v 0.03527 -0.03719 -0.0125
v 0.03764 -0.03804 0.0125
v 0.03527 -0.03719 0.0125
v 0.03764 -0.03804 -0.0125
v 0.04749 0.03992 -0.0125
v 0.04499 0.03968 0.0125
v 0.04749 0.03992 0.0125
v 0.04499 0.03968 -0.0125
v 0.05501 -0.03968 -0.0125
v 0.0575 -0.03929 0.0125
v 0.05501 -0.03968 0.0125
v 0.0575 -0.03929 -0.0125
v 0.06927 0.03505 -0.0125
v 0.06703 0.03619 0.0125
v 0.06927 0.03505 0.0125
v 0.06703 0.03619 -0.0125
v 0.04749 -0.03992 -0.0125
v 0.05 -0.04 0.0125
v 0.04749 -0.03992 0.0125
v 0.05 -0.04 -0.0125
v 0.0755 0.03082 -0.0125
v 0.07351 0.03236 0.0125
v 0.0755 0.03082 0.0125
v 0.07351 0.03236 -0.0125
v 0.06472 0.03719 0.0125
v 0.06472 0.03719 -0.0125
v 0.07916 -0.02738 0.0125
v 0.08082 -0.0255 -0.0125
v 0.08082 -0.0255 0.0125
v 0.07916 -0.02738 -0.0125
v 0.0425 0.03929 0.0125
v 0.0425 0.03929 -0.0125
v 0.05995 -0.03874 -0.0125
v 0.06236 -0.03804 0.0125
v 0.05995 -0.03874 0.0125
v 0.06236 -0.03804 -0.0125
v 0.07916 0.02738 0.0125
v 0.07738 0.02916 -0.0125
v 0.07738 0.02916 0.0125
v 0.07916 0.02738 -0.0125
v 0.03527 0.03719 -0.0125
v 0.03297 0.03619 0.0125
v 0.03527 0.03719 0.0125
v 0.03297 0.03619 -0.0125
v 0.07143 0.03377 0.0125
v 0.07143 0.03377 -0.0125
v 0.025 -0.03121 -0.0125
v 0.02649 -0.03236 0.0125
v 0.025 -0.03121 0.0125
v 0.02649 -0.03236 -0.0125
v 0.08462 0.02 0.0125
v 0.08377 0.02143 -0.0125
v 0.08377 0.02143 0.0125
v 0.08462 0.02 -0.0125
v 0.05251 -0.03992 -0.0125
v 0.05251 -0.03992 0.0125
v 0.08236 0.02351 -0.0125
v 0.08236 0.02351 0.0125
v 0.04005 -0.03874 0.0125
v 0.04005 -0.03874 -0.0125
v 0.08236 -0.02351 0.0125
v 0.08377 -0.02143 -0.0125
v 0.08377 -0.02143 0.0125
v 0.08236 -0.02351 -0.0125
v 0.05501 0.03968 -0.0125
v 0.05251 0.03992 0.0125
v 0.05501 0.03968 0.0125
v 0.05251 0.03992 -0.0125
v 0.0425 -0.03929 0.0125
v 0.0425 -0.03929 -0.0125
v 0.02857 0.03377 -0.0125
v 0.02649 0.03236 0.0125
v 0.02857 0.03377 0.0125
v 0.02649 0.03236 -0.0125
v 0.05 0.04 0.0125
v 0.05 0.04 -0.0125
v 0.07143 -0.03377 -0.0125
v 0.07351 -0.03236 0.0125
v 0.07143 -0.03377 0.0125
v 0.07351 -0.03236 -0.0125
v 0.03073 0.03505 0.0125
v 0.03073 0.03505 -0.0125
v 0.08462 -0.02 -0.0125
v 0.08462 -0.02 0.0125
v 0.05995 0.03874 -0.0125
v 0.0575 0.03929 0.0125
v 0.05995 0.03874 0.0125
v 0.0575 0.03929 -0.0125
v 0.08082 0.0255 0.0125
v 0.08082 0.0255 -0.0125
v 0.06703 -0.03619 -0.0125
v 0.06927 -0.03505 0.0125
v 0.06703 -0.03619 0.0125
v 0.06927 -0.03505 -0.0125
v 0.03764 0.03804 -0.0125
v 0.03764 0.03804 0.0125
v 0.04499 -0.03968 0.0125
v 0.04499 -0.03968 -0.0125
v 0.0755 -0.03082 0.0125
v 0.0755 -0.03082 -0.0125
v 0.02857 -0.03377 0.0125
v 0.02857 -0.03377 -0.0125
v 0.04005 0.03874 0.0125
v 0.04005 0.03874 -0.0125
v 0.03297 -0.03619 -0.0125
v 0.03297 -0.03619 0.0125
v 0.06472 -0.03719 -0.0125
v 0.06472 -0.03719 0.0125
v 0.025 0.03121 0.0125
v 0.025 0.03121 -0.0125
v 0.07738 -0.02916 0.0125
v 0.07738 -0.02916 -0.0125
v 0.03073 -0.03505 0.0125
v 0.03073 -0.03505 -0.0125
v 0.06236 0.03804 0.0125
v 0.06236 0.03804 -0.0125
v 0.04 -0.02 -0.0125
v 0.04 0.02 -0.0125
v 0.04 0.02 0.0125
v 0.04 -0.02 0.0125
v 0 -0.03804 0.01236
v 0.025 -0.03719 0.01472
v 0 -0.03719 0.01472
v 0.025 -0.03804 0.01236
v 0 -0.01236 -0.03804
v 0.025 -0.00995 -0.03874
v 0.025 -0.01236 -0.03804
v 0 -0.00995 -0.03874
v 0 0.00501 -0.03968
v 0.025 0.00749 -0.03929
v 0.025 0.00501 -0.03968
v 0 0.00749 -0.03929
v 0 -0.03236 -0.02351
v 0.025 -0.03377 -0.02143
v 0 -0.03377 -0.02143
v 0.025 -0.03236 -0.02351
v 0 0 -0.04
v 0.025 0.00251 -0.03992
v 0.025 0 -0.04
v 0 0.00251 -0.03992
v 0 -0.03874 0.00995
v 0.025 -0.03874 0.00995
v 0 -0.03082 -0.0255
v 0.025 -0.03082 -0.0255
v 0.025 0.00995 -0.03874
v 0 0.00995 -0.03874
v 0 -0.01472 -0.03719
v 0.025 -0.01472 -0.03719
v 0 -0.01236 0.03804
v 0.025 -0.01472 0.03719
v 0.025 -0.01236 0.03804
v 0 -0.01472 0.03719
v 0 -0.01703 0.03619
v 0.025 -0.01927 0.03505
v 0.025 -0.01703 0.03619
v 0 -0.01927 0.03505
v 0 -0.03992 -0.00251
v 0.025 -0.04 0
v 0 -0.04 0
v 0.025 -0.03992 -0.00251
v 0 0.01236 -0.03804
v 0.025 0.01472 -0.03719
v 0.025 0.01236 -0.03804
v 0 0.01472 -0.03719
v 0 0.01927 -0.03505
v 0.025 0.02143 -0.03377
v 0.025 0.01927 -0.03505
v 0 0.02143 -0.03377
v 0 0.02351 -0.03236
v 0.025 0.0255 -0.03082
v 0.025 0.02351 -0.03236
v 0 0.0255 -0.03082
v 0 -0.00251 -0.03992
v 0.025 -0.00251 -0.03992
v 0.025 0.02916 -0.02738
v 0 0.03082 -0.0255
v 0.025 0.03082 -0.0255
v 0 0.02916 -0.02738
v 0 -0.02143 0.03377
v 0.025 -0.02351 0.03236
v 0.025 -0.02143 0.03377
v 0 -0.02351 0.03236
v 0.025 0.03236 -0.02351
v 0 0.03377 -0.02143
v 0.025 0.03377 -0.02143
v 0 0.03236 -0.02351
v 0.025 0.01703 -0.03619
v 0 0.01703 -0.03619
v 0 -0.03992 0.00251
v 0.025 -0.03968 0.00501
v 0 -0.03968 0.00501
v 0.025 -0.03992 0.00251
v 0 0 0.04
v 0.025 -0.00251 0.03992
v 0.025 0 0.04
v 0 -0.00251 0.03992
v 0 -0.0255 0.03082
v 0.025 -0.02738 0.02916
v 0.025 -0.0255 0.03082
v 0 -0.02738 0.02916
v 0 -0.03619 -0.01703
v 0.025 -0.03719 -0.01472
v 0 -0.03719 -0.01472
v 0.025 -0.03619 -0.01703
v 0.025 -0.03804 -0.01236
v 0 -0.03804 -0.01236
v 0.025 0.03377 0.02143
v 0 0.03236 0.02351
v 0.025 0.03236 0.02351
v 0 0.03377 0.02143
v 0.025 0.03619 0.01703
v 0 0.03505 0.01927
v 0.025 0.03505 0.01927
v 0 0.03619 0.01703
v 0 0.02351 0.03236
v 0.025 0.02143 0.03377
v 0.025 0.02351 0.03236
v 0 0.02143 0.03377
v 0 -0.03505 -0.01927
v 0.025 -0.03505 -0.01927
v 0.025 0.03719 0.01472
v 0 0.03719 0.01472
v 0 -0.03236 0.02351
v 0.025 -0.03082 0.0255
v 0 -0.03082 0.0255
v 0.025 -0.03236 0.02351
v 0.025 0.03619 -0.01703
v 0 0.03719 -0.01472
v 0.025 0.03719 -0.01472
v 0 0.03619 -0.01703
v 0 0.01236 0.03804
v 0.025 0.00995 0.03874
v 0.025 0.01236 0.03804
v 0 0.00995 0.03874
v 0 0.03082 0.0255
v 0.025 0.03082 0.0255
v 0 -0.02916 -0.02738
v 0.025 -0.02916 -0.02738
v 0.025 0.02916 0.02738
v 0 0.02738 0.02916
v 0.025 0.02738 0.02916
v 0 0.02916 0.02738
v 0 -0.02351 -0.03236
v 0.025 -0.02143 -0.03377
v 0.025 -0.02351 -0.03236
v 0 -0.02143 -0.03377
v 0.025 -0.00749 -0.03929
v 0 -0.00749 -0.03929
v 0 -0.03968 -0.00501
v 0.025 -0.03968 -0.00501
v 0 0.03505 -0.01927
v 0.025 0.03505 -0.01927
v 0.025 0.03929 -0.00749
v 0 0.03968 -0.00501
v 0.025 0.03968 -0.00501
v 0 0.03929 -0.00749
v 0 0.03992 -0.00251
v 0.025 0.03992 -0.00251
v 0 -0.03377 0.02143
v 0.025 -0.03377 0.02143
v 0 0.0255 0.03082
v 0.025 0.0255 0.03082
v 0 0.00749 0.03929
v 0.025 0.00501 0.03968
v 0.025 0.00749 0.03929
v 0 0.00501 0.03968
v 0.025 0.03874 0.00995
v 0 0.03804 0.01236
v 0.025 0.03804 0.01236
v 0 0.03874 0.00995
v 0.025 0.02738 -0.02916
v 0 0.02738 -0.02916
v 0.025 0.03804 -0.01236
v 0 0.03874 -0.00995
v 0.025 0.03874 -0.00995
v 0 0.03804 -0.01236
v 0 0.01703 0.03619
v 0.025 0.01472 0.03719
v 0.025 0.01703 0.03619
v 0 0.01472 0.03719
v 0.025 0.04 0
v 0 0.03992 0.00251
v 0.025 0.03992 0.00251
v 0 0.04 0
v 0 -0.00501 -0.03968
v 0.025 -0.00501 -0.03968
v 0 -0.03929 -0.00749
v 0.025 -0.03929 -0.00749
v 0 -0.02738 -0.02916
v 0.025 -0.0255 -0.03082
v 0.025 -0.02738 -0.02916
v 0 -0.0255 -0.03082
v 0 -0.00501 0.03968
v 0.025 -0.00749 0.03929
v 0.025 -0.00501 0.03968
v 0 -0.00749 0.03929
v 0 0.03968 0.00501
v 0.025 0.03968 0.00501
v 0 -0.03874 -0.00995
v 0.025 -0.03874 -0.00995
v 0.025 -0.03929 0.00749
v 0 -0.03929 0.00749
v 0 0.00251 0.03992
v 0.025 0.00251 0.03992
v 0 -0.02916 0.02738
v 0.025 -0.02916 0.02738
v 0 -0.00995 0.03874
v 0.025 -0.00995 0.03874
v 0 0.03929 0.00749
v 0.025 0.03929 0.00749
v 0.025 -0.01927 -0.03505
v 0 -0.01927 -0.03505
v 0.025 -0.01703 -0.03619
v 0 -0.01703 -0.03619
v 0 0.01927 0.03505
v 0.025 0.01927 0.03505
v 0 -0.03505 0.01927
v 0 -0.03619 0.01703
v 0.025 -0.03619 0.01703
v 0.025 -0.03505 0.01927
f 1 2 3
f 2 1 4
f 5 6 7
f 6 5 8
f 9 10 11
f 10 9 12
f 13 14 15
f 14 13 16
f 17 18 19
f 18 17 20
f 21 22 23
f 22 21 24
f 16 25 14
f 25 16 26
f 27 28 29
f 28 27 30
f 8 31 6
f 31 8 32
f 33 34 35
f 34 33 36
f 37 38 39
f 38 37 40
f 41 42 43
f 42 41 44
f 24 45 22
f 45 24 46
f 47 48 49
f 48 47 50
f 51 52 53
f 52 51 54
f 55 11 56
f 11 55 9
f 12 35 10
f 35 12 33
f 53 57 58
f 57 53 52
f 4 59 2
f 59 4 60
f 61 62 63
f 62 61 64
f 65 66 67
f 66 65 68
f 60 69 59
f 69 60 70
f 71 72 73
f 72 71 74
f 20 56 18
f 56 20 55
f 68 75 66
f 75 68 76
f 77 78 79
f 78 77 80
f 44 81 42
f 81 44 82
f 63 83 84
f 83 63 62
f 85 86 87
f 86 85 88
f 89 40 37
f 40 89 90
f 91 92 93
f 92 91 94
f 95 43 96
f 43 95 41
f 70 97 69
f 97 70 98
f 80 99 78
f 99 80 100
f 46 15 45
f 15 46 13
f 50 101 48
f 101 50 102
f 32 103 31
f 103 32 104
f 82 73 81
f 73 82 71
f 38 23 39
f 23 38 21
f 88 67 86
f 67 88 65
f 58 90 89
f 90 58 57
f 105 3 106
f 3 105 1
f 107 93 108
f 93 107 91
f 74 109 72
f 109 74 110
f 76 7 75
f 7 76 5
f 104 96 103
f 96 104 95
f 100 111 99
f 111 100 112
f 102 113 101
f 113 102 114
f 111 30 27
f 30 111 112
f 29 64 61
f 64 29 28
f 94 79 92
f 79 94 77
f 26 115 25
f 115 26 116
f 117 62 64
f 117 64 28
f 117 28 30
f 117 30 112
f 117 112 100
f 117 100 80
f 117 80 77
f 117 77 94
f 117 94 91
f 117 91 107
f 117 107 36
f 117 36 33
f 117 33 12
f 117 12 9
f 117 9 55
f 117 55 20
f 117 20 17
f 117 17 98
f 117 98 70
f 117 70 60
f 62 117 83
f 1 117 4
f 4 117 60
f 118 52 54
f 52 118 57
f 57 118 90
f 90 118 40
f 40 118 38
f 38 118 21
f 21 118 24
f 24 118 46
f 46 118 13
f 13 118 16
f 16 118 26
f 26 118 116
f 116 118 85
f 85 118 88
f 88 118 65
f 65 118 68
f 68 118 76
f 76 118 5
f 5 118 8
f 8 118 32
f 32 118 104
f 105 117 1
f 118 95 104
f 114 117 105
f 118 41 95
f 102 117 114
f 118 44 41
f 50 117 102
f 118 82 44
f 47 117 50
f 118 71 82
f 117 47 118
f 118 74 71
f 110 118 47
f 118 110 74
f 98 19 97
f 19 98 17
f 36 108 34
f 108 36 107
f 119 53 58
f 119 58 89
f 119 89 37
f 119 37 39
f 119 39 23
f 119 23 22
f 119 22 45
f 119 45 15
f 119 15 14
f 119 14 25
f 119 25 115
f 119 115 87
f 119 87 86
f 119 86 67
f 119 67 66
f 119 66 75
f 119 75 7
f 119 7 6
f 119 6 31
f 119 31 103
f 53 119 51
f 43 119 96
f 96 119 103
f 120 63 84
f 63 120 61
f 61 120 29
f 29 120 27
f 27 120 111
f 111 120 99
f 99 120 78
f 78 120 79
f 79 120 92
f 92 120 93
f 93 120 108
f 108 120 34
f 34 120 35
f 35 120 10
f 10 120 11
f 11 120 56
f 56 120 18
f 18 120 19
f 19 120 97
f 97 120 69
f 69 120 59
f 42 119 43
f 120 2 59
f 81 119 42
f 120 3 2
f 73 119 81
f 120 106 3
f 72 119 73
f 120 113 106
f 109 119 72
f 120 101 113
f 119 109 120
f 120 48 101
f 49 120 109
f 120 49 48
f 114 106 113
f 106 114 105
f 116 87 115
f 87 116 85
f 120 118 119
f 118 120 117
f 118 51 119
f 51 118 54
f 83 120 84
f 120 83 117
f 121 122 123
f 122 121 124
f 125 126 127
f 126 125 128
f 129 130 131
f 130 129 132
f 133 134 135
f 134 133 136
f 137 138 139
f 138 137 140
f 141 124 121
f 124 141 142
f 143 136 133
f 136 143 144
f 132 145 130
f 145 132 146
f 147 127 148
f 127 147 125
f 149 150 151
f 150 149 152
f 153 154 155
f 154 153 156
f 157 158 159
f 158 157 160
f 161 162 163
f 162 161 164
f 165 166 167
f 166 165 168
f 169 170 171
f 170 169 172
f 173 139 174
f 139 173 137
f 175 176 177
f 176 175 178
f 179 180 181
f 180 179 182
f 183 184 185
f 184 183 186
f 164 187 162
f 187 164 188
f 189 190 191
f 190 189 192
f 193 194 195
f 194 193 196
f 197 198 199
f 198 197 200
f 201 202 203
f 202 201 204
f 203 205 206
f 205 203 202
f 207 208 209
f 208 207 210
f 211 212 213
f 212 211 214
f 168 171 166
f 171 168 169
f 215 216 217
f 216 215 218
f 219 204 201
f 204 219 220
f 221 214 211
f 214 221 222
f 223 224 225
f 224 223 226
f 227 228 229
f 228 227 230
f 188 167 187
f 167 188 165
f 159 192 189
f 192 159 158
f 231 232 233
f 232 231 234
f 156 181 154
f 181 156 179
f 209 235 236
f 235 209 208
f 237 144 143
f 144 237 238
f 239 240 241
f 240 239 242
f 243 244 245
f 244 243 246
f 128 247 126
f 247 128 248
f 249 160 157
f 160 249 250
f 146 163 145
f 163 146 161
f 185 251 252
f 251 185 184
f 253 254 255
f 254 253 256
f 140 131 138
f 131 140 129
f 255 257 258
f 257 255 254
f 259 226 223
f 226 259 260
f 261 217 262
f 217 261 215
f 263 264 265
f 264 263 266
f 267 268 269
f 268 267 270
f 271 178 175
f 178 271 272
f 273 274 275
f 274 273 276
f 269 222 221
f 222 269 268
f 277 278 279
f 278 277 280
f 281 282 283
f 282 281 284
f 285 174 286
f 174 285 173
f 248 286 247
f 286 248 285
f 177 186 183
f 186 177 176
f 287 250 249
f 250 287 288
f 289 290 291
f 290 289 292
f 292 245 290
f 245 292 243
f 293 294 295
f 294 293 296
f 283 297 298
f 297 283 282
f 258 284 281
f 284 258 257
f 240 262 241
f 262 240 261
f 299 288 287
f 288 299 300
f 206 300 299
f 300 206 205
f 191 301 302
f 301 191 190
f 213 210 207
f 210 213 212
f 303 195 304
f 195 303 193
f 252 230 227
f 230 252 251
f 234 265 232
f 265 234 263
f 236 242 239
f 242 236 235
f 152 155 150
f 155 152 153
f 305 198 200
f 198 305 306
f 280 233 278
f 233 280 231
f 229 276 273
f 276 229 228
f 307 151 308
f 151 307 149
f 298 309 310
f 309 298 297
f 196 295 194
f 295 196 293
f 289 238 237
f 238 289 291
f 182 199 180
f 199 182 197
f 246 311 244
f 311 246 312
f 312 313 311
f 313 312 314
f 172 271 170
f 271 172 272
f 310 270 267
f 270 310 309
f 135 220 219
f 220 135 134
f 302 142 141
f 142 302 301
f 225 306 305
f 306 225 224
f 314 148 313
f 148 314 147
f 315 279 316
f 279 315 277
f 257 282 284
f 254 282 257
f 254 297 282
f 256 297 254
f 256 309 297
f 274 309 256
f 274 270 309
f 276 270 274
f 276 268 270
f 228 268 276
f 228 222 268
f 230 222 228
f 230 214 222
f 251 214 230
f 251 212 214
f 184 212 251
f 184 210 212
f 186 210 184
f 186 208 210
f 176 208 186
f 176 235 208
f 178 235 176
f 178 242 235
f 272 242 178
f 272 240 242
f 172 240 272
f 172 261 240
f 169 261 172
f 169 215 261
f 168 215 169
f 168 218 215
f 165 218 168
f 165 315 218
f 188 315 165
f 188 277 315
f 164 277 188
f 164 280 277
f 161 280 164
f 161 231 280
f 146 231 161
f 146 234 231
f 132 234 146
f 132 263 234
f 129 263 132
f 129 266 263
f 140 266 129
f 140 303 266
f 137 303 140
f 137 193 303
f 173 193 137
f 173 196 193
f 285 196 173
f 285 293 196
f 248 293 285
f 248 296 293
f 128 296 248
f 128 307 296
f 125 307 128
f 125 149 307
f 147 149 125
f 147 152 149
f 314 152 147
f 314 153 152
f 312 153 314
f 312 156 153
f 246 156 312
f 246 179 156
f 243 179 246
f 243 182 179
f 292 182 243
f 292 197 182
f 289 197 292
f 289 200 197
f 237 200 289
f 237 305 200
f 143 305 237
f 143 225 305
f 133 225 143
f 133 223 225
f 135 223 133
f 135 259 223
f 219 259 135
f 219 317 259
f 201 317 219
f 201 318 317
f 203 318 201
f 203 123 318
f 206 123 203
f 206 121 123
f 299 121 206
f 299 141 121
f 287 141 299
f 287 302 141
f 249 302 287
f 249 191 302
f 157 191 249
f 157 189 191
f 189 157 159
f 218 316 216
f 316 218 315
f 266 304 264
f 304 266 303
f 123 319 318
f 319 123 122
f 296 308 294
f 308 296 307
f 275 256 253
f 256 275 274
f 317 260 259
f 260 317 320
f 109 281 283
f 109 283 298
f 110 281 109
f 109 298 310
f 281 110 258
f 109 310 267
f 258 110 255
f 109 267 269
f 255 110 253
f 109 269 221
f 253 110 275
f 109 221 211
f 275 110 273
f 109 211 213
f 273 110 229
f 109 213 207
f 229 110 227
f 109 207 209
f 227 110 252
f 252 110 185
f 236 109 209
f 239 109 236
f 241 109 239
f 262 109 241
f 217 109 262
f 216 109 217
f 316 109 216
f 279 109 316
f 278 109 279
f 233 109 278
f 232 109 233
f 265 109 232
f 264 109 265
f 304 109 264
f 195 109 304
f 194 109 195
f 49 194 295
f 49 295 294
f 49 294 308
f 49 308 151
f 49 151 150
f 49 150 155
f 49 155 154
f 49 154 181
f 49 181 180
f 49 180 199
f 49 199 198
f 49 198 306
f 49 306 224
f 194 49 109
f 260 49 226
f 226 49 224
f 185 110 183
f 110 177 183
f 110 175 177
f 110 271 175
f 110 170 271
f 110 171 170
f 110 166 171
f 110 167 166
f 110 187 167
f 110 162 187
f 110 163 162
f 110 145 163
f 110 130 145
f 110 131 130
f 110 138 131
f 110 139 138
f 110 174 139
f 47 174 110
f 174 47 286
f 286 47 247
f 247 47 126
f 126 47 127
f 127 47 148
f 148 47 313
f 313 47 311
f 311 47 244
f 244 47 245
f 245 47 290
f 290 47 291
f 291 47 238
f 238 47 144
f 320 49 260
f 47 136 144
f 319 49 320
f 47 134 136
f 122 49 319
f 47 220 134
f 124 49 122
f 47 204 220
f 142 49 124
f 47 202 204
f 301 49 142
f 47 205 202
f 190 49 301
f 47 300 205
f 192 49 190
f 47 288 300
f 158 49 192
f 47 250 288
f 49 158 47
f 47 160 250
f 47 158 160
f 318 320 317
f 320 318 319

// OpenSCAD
$fn = 100;
m = 0.3;
l = 0.1;
w = 0.04;
translate([0,0,0])

rotate([0,90,0])
    
    cylinder(l*0.25,w,w);
 difference() {   
    translate([w*1.25,0,-l*0.25 / 2])
    cylinder(l*0.25,w,w);

translate([w*1,-w/2,-l*0.25 / 2 - 0.005])
    cube([l,w,w]);
    
        
 }
    
